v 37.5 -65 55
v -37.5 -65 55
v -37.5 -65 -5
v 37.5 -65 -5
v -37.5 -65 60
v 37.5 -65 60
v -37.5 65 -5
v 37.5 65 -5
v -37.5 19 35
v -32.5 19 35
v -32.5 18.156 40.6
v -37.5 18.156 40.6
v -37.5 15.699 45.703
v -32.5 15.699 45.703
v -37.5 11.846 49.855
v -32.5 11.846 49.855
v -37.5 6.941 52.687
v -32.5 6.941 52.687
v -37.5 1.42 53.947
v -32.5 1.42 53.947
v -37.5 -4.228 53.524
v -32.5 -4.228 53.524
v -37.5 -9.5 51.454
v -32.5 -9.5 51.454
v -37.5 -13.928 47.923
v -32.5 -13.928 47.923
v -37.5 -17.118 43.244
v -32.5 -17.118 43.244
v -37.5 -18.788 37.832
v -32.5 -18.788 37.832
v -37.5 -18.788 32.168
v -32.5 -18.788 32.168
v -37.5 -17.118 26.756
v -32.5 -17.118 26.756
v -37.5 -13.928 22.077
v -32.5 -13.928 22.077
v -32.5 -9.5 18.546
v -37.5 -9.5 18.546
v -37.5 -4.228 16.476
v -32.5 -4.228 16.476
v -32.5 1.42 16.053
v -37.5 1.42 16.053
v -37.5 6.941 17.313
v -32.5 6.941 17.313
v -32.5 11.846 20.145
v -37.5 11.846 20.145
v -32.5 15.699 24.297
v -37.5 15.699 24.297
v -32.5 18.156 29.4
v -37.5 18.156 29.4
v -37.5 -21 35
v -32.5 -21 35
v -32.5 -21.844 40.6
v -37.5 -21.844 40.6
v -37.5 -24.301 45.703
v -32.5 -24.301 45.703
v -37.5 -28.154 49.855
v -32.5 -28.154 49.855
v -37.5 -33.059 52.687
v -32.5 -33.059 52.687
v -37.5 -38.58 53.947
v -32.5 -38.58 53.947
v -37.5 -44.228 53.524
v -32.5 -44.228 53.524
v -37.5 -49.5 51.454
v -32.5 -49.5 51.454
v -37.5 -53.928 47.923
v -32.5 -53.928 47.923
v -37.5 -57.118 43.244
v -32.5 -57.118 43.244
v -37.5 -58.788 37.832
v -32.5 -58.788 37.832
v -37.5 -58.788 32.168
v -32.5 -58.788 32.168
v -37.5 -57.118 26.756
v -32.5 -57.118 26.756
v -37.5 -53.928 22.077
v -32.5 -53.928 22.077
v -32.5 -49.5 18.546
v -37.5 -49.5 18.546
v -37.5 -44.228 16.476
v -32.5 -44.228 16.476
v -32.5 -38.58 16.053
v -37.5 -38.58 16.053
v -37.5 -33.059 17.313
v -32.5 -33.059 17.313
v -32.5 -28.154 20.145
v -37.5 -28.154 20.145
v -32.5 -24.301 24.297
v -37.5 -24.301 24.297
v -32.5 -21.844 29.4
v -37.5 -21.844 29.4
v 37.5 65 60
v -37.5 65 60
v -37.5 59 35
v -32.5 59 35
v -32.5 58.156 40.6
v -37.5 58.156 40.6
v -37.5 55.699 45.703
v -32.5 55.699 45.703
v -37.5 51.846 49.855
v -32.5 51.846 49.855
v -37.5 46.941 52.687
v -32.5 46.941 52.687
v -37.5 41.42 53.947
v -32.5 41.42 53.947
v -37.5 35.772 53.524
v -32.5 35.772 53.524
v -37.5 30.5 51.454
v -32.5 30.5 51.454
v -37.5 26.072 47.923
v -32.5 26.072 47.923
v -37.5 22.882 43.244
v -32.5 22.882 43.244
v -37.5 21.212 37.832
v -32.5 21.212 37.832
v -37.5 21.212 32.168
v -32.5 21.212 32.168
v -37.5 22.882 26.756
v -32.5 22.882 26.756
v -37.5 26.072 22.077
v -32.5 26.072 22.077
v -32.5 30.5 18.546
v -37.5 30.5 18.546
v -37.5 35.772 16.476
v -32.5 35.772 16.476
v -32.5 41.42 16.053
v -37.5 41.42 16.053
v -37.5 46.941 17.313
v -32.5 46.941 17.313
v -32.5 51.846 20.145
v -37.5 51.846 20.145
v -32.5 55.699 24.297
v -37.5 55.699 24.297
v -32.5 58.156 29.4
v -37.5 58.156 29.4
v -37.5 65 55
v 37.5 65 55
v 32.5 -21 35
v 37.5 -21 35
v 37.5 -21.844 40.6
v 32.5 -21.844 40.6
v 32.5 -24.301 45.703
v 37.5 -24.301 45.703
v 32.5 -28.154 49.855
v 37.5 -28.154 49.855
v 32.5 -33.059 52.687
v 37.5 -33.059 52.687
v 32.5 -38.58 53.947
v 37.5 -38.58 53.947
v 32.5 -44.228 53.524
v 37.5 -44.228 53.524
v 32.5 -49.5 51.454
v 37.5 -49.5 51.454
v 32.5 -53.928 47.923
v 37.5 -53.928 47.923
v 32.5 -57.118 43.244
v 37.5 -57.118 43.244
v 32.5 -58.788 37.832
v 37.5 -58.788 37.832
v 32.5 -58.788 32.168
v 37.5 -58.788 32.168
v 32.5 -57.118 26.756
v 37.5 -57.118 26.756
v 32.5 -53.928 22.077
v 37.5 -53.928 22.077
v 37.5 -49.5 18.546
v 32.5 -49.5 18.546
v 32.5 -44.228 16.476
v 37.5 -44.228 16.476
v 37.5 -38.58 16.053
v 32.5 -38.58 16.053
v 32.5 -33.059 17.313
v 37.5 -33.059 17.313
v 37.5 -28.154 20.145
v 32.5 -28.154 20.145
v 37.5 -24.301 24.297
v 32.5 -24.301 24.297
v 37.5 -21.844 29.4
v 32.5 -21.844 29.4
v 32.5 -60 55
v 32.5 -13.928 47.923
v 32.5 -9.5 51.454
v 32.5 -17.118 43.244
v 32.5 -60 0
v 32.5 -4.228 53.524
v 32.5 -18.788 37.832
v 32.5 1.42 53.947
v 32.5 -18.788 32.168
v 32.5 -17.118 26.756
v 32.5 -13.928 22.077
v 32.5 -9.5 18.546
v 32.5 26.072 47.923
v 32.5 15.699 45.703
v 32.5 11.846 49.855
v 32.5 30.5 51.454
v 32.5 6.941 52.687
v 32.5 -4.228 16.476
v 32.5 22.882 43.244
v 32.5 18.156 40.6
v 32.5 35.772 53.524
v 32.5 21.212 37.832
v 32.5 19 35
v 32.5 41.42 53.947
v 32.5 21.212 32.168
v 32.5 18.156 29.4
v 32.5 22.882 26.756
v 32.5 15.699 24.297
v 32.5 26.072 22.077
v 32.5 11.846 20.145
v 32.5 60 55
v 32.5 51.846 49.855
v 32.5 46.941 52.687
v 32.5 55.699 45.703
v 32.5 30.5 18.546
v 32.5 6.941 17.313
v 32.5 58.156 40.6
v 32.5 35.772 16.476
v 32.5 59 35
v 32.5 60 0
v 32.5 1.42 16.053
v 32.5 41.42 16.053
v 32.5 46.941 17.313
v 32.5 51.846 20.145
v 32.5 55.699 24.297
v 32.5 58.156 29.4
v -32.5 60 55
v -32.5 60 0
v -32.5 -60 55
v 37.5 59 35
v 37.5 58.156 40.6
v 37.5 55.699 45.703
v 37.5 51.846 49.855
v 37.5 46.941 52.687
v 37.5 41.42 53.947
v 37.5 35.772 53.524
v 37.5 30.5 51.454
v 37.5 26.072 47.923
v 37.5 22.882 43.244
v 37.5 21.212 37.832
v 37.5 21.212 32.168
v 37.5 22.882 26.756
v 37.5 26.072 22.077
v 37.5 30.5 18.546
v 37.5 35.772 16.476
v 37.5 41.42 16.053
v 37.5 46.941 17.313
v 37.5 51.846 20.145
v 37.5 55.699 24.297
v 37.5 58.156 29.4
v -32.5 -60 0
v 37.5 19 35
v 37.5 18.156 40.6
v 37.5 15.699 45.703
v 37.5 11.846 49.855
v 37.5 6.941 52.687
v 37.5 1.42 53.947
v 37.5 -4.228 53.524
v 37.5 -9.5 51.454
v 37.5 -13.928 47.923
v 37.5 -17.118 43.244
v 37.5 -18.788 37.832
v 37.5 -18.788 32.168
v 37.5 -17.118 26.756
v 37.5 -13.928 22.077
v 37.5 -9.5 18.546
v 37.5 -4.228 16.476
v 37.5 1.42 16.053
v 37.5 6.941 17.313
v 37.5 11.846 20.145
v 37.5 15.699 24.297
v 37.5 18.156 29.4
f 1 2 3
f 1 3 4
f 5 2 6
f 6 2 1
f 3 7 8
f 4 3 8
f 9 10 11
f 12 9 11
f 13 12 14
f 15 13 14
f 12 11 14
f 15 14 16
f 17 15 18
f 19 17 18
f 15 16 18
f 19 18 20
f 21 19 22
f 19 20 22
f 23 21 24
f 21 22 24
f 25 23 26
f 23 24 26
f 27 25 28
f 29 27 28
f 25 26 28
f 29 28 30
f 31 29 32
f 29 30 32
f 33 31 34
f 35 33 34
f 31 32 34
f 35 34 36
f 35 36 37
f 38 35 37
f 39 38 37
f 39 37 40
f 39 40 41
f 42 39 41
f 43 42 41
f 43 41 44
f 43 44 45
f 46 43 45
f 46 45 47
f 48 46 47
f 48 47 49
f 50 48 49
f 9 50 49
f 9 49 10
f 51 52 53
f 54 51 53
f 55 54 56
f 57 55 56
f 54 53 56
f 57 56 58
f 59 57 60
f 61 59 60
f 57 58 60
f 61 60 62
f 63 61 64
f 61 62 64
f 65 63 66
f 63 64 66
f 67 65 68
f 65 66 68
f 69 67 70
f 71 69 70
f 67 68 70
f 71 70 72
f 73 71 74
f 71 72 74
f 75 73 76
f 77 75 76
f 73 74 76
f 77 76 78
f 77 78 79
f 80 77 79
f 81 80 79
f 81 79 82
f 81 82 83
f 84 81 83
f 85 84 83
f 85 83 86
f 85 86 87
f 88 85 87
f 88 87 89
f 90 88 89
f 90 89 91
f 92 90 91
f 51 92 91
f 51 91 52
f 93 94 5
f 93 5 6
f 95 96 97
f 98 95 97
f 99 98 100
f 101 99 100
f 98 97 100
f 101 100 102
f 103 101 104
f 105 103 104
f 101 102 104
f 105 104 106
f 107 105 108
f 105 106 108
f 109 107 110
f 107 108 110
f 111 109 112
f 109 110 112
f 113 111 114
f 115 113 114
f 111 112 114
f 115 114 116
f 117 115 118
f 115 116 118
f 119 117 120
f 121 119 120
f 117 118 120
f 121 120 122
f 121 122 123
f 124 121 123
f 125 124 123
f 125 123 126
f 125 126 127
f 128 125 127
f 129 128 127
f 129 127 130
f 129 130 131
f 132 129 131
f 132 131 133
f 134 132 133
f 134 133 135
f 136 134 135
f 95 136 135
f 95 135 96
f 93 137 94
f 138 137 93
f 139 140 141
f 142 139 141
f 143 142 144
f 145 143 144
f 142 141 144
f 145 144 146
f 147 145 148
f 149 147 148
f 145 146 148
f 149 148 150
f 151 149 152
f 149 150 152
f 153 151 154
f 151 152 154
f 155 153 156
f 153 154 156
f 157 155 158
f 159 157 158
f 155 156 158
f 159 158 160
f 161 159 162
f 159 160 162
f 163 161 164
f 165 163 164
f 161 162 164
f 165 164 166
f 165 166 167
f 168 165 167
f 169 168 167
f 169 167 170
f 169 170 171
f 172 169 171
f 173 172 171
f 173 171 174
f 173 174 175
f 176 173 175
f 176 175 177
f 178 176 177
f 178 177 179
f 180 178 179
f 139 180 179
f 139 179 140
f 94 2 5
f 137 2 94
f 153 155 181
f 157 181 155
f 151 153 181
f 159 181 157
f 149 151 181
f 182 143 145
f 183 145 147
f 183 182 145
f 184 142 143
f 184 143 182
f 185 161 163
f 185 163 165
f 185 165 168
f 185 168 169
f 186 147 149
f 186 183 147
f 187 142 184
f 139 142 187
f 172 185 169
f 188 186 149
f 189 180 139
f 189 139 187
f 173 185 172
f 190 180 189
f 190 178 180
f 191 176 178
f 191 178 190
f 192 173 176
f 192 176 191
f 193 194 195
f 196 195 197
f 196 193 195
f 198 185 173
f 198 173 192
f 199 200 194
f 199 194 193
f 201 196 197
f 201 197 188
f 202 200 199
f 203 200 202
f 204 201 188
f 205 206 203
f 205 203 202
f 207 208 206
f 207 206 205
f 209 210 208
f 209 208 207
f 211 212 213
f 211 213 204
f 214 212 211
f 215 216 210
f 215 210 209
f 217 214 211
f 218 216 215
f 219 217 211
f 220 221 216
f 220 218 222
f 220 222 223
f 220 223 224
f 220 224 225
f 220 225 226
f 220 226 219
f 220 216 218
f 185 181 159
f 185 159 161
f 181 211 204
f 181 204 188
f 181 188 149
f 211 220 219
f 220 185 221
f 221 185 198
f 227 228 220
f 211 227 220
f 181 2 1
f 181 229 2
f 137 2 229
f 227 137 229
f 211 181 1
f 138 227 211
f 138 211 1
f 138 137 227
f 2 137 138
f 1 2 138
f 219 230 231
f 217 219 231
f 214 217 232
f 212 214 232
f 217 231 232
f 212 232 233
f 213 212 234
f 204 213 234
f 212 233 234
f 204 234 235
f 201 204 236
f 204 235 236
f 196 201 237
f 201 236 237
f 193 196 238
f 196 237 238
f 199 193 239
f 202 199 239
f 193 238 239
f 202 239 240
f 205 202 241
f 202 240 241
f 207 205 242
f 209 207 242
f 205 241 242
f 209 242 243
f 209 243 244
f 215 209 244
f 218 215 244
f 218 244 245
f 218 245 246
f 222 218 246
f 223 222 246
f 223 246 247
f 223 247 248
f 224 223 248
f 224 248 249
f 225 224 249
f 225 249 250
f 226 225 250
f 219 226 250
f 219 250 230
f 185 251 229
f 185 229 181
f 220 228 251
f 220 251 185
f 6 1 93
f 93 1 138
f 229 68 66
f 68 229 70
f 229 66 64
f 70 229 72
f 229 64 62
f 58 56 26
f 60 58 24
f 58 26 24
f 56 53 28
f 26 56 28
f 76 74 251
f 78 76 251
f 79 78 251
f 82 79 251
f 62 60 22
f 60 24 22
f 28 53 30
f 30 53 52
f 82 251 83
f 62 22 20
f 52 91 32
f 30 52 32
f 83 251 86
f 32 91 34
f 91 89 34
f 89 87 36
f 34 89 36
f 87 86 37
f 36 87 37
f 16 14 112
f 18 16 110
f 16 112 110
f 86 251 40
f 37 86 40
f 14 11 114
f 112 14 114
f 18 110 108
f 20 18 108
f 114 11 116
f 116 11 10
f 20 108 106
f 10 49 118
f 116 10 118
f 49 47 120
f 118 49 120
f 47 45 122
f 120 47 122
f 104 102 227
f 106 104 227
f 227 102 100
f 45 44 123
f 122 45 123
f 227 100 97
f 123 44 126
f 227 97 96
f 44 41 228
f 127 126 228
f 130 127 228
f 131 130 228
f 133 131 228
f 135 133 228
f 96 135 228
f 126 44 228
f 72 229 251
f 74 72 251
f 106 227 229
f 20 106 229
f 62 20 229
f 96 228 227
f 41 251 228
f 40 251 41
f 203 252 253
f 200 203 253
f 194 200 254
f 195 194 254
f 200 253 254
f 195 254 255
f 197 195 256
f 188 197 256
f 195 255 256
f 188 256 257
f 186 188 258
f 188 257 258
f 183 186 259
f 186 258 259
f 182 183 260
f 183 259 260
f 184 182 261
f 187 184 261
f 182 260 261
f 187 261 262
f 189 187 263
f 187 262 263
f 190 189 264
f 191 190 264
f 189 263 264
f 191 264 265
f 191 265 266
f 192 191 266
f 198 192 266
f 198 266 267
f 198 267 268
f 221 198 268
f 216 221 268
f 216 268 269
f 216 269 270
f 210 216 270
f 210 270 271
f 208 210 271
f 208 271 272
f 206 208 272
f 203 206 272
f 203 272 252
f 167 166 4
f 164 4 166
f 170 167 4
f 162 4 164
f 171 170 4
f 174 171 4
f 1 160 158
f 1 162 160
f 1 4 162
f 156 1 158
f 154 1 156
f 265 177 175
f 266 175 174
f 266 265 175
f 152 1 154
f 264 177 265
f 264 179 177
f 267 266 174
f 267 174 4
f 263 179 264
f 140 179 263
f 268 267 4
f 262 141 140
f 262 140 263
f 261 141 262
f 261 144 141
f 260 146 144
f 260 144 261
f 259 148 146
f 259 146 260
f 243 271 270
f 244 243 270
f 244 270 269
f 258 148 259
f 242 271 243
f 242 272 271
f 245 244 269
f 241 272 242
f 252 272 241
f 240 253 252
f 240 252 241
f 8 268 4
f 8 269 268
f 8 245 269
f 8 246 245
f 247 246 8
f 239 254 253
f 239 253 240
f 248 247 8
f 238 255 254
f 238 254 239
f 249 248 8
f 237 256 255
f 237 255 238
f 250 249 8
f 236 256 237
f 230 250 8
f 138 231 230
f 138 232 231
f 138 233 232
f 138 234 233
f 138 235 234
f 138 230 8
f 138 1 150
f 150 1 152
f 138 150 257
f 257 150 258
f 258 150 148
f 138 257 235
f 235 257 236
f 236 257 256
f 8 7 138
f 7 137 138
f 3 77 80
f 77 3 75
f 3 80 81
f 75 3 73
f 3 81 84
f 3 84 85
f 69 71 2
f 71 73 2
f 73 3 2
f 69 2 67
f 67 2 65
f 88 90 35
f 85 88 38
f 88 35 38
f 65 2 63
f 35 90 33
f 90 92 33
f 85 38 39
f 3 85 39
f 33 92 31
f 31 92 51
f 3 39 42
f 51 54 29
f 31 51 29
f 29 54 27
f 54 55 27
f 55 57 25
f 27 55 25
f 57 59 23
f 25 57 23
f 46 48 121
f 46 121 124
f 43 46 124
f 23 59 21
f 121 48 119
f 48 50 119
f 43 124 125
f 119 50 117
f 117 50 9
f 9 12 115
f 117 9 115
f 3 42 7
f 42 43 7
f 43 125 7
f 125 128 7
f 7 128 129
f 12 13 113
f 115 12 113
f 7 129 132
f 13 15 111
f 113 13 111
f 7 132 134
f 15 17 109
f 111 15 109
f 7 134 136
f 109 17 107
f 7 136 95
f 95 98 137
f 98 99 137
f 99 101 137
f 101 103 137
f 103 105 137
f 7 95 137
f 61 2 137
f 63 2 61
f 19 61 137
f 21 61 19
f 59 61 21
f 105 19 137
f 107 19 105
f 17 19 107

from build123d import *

# Parameters (mm, degrees)
F0_W     = 75
F0_H     = 130
F0_W_2   = 65
F0_H_2   = 120
F1_DEPTH = 55
F2_W     = 75
F2_H     = 130
F3_DEPTH = 5
F4_W     = 75
F4_H     = 130
F5_DEPTH = 5
F6_R     = 19
F7_DEPTH = 75.001


with BuildPart() as f1:
    # F0 (on Top) → F1 (new body)
    with BuildSketch(Plane.XY):
        Rectangle(F0_W, F0_H)
        Rectangle(F0_W_2, F0_H_2, mode=Mode.SUBTRACT)
    extrude(amount=F1_DEPTH)

    # F2 (on Top) → F3 (join)
    with BuildSketch(Plane.XY):
        Rectangle(F2_W, F2_H)
    extrude(amount=-F3_DEPTH)

    # F6 (on face) → F7 (cut, through all)
    with BuildSketch(Plane.YZ.offset(37.5)):
        with Locations((-40, 35)):
            Circle(F6_R)
        with Locations((0, 35)):
            Circle(F6_R)
        with Locations((40, 35)):
            Circle(F6_R)
    extrude(amount=-F7_DEPTH, mode=Mode.SUBTRACT)


with BuildPart() as f5:
    # F4 (on face) → F5 (new body)
    with BuildSketch(Plane.XY.offset(55)):
        Rectangle(F4_W, F4_H)
    extrude(amount=F5_DEPTH)


solid = Compound([f1.part, f5.part])
